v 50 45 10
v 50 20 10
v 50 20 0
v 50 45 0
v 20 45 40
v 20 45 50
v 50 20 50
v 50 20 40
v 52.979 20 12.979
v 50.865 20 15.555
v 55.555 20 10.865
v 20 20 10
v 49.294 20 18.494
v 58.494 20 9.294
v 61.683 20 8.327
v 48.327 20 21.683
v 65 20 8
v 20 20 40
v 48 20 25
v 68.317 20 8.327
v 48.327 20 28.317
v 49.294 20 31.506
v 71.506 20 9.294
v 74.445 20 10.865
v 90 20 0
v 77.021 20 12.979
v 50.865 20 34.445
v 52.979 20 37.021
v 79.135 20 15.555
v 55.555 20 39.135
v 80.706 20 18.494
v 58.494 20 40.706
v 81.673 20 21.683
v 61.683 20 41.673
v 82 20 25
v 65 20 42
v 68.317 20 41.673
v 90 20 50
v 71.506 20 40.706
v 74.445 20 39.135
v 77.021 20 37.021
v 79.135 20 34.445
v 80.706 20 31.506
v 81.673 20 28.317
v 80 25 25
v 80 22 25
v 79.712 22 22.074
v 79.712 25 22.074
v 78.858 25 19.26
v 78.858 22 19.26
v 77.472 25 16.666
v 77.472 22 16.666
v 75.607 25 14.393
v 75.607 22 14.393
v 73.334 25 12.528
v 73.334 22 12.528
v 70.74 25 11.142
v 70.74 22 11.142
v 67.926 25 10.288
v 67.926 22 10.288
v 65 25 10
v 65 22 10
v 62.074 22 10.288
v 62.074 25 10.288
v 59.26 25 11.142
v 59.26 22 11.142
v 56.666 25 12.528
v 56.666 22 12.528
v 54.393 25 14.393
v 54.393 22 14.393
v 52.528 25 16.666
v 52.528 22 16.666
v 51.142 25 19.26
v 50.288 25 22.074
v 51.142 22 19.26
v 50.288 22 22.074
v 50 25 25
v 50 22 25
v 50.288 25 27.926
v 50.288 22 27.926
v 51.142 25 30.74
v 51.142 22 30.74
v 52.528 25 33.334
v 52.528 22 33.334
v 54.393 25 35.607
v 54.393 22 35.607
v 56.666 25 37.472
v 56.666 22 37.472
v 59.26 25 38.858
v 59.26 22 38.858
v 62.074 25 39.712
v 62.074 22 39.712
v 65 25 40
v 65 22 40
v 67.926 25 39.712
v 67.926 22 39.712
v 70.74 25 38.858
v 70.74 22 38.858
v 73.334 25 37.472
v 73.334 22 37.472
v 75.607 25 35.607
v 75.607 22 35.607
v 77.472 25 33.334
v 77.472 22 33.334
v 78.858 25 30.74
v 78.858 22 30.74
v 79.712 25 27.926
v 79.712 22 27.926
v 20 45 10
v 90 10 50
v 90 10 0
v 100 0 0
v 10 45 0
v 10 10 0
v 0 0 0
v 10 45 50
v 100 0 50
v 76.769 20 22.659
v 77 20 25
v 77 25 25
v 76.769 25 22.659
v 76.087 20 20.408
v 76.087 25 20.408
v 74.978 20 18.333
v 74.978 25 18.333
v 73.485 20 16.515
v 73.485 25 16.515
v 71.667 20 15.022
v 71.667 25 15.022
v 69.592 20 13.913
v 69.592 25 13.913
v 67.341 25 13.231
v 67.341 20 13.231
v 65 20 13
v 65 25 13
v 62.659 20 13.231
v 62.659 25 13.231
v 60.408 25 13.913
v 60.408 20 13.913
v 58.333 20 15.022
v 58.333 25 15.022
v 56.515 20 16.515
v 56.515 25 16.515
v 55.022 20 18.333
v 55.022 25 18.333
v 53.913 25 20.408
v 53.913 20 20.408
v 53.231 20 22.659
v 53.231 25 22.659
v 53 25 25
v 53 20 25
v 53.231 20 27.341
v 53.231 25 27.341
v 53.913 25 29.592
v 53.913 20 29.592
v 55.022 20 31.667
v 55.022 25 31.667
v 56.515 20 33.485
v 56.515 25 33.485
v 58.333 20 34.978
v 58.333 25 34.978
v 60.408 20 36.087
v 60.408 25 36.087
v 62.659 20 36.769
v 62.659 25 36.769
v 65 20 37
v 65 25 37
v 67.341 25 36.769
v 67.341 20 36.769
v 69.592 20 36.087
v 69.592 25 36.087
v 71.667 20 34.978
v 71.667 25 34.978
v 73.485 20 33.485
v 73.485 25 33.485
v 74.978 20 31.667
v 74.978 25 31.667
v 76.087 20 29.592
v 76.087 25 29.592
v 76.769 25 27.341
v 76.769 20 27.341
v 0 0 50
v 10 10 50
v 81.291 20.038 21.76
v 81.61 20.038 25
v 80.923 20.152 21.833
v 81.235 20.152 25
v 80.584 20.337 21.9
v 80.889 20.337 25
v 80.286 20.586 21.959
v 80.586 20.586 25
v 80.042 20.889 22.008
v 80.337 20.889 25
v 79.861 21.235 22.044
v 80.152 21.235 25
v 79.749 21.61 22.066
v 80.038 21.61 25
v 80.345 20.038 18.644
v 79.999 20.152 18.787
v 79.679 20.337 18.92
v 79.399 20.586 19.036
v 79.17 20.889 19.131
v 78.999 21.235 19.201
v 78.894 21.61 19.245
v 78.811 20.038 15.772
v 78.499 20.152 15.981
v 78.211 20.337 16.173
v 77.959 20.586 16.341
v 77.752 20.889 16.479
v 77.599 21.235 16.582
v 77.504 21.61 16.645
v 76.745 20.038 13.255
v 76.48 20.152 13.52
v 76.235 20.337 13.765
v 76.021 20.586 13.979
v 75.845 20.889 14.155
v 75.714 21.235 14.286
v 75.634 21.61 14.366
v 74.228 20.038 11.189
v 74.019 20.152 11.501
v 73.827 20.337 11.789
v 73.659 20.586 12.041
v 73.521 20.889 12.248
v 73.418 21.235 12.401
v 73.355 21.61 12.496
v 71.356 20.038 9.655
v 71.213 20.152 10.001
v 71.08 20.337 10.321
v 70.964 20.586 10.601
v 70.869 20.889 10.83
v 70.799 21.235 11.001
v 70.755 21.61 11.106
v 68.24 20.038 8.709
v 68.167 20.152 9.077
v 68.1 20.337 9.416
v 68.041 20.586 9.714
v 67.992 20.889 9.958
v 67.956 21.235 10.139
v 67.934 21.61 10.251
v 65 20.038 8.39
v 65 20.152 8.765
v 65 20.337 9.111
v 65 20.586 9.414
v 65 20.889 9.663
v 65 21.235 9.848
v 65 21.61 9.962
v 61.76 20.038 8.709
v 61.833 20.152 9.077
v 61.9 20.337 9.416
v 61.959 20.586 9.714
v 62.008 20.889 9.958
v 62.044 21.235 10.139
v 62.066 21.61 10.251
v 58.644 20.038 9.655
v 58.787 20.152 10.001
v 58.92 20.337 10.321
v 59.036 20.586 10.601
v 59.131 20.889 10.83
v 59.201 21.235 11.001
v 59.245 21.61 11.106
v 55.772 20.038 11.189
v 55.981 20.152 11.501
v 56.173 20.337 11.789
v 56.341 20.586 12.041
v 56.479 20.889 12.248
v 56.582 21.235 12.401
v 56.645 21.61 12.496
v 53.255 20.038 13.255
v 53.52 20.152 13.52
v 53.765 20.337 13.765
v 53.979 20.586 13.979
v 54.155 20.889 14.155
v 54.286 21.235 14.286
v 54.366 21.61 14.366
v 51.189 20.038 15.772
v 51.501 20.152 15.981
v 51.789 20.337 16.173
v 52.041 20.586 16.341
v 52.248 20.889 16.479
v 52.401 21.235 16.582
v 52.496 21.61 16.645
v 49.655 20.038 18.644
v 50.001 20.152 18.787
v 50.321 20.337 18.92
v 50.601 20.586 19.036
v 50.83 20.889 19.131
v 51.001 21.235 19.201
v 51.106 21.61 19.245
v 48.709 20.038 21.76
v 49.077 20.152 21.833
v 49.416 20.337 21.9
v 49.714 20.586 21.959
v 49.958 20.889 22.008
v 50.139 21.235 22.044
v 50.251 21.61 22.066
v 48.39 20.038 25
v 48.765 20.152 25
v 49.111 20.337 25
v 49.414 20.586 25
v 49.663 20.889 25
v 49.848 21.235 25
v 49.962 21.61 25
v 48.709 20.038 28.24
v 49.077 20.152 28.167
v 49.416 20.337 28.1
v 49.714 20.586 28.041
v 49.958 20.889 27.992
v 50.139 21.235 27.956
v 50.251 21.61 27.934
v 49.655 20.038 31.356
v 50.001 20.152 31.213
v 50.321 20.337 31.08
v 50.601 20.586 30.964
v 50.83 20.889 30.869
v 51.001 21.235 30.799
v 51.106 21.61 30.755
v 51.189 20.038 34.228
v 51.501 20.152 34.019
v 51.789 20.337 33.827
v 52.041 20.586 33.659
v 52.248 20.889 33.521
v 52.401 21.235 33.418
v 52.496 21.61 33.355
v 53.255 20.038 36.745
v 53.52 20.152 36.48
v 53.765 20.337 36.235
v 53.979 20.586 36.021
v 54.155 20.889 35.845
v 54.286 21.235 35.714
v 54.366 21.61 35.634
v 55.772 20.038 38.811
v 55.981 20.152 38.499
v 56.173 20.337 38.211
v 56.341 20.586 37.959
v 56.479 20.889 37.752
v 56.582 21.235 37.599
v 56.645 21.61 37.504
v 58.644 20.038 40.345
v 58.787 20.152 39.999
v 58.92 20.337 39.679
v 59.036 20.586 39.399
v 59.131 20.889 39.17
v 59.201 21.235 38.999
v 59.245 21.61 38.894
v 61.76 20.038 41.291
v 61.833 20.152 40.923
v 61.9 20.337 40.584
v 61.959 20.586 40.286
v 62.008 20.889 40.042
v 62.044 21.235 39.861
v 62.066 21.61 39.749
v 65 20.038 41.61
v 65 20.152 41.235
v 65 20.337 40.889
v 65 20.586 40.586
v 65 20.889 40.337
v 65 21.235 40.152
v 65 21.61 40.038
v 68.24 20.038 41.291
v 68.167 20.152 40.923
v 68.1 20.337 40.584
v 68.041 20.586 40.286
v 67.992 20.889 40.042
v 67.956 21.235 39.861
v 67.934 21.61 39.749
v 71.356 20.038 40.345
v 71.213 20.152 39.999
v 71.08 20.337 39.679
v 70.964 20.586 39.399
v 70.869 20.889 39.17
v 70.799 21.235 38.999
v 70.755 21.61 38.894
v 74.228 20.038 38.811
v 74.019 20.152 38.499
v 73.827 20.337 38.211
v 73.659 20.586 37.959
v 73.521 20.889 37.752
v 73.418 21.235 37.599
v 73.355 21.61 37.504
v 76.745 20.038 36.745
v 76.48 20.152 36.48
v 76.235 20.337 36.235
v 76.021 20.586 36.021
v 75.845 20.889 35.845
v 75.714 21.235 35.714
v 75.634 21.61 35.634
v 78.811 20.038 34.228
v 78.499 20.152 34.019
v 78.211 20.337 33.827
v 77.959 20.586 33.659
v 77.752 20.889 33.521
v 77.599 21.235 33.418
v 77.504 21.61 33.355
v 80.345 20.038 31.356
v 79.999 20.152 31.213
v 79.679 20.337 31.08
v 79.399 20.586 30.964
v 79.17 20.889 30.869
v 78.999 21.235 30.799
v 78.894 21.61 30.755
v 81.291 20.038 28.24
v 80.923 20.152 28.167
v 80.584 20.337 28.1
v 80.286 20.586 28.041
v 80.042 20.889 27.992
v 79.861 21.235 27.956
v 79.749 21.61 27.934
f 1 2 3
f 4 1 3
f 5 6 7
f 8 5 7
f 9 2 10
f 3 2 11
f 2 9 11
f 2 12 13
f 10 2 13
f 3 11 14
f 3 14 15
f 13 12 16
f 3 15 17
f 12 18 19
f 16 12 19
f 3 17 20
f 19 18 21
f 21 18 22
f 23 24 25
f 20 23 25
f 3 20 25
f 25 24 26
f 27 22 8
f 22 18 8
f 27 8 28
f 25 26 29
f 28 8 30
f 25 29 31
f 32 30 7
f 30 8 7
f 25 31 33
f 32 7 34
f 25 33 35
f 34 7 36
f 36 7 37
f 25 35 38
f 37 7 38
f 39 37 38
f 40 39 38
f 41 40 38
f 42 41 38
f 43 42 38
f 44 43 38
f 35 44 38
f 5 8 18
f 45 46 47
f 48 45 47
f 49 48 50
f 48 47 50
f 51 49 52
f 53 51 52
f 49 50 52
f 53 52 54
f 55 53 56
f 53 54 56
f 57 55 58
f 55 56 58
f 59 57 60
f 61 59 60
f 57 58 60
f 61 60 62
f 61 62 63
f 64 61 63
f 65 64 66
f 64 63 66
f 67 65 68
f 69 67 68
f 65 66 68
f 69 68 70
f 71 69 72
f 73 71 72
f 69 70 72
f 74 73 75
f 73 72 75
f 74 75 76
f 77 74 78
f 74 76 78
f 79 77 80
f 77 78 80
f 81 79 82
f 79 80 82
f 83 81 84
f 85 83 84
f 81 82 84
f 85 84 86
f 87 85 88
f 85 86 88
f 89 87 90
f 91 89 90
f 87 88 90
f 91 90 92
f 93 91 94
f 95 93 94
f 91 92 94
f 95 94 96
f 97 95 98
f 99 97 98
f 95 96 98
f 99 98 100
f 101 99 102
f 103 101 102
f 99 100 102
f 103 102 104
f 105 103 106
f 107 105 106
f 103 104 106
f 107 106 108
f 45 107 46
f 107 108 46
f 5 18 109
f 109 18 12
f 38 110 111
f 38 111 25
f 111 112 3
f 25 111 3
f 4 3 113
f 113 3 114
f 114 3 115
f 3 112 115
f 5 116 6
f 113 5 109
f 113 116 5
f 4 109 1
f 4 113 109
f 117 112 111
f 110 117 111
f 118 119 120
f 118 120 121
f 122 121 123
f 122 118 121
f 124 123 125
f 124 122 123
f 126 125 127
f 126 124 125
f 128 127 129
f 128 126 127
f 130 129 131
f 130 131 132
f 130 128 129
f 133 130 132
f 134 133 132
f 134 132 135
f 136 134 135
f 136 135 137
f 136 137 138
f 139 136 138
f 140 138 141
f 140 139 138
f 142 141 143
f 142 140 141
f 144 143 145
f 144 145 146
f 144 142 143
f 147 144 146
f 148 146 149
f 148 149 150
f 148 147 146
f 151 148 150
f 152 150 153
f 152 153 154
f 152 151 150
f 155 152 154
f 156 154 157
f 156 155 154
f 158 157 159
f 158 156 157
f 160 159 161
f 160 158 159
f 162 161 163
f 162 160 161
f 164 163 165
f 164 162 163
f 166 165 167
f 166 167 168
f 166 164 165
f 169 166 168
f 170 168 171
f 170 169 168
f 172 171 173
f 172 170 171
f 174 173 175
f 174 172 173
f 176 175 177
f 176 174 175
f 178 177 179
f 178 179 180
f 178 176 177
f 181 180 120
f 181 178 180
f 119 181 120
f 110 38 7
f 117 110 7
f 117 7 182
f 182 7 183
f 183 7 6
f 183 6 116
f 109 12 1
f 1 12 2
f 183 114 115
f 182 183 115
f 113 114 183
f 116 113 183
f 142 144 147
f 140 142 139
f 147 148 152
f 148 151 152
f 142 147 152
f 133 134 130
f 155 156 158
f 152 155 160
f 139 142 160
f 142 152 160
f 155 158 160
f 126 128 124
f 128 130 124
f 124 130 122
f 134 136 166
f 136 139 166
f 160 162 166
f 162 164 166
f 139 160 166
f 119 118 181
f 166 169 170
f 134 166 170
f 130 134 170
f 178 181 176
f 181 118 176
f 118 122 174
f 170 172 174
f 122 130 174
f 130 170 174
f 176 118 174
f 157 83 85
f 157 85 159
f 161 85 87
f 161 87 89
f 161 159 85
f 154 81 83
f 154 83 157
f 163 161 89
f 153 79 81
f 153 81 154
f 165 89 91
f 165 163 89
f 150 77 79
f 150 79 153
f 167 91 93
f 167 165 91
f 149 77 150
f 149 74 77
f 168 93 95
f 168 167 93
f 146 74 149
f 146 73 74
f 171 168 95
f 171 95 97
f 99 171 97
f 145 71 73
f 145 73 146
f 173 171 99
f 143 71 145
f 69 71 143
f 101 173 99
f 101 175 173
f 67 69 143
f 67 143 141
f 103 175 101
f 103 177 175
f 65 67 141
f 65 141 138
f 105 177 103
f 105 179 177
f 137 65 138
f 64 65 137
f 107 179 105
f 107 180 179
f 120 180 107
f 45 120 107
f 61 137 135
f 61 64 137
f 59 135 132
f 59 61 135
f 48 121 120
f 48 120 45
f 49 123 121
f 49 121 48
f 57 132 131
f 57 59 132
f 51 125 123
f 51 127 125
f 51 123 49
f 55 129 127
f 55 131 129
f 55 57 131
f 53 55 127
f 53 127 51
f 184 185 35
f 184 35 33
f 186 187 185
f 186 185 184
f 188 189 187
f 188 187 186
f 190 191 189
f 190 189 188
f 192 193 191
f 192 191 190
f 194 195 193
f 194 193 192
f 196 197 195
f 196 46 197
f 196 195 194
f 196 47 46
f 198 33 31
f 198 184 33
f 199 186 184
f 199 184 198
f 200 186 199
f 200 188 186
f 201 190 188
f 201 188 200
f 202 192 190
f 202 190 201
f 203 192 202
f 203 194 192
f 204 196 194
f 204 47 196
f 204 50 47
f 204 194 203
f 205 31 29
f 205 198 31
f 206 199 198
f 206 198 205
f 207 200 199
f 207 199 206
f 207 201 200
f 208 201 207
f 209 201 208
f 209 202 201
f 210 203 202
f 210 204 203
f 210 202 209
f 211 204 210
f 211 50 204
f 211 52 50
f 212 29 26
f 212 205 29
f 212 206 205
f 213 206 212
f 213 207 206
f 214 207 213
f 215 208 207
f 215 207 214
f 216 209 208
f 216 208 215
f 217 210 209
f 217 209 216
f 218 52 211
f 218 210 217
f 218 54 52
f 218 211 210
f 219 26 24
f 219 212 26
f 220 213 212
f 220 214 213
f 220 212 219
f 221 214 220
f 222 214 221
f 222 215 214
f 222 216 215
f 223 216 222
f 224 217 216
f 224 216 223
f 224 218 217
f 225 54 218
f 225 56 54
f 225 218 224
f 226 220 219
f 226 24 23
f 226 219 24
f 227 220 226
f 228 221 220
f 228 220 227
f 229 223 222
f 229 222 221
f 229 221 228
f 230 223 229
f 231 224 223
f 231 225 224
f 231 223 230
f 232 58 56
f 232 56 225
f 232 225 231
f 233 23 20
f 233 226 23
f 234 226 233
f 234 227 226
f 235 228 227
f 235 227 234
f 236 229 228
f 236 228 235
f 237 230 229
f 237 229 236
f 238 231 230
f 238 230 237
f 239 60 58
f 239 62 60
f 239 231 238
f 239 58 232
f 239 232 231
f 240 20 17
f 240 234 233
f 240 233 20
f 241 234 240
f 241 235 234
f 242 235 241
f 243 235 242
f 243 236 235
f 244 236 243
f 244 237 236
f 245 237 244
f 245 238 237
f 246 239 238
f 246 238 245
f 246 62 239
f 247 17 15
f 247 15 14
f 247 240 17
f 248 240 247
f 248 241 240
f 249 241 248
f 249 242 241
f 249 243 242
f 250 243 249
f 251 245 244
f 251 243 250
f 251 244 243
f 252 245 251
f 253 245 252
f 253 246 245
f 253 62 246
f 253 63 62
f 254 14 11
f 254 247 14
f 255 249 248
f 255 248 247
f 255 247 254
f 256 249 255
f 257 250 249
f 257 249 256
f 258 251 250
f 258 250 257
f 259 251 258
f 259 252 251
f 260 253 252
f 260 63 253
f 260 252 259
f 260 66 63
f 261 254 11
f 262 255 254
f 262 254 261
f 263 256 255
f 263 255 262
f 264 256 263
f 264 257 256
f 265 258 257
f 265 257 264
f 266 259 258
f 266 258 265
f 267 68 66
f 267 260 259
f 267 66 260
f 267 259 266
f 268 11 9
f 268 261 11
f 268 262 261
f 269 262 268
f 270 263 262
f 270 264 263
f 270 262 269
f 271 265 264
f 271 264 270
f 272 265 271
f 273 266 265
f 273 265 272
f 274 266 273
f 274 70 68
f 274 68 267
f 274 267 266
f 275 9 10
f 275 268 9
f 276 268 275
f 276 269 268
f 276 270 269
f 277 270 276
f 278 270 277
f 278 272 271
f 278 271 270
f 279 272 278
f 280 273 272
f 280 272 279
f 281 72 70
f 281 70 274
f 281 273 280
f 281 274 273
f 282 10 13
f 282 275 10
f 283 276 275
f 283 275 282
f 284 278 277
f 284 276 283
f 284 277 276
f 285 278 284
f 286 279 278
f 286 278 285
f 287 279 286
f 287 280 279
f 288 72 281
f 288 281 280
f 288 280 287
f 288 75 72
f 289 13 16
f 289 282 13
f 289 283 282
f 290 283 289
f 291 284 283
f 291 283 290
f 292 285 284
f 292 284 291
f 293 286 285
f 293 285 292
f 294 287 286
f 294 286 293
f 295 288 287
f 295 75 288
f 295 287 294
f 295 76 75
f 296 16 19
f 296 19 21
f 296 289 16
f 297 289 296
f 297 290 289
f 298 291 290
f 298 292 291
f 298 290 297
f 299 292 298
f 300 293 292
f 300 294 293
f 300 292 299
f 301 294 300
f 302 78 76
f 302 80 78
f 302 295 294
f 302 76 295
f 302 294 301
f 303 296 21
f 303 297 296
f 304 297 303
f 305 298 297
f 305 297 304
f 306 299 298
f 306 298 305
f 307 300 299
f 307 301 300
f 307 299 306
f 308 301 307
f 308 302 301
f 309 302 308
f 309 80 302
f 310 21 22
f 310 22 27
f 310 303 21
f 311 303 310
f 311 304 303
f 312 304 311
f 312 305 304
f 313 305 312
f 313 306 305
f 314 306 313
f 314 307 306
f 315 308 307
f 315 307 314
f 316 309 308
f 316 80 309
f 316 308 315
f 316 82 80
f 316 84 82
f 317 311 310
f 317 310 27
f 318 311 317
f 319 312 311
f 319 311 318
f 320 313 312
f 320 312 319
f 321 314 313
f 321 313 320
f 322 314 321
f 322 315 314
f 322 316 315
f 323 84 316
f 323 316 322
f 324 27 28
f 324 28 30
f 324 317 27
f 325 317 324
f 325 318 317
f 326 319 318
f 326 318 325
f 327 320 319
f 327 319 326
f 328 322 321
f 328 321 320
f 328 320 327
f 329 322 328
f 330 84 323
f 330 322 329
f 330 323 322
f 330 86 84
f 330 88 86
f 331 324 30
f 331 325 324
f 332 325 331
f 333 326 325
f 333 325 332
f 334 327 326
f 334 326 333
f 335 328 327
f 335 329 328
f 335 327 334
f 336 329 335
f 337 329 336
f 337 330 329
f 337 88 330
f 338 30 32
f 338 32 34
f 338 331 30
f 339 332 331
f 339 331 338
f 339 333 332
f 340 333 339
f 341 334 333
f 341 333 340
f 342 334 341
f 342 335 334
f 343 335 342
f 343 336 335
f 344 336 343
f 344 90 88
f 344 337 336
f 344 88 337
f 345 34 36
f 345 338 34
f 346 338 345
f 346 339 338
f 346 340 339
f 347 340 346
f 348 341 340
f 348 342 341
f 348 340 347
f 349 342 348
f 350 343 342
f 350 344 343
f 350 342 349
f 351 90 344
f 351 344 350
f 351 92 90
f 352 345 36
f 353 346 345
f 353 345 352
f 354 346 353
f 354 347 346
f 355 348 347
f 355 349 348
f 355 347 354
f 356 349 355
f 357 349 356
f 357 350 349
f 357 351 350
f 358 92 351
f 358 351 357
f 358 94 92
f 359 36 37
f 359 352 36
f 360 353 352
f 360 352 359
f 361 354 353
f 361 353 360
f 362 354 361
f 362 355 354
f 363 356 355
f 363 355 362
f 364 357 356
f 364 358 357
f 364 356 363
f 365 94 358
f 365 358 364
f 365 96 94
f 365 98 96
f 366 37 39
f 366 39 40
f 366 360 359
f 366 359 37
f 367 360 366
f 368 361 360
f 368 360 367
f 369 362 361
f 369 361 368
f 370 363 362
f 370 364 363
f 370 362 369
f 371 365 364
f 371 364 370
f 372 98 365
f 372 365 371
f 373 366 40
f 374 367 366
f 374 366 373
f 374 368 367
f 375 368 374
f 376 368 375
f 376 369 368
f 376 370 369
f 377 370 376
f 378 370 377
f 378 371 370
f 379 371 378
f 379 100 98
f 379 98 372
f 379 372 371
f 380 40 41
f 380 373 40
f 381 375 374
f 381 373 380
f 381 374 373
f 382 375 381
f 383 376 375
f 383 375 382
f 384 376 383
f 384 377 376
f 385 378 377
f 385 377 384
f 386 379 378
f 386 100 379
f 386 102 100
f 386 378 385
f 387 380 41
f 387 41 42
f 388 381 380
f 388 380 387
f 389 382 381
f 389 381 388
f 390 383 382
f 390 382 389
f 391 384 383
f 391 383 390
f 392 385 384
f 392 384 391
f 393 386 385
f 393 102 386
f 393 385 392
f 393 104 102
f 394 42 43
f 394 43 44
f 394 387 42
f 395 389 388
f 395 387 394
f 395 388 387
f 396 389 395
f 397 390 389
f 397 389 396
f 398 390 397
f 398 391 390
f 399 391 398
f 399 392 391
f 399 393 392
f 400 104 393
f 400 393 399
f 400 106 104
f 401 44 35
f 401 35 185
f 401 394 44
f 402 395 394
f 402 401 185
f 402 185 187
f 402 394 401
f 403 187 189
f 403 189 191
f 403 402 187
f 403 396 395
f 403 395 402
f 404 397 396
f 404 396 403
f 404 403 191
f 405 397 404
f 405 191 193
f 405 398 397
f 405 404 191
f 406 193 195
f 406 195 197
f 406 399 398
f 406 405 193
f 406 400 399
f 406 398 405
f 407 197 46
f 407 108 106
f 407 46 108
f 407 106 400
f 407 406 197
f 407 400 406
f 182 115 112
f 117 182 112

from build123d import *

# Parameters (mm, degrees)
BOSS_EXTRU_3_DEPTH = 50
ESQUISSE3_W        = 80
ESQUISSE3_H        = 10
BOSS_EXTRU_4_DEPTH = 50
ESQUISSE4_R        = 15
ESQUISSE4_R_2      = 12
BOSS_EXTRU_5_DEPTH = 5
CONG_1_R           = 2
BOSS_EXTRU_6_DEPTH = 25
BOSS_EXTRU_7_DEPTH = 10


with BuildPart() as part:
    # Esquisse2 → Boss.-Extru.3 (new body)
    with BuildSketch(Plane.XY):
        Polygon((0, 0), (100, 0), (90, 10), (10, 10), align=None)
    extrude(amount=BOSS_EXTRU_3_DEPTH)

    # Esquisse3 → Boss.-Extru.4 (add)
    with BuildSketch(Plane.XY.offset(50)):
        with Locations((50, 15)):
            Rectangle(ESQUISSE3_W, ESQUISSE3_H)
    extrude(amount=-BOSS_EXTRU_4_DEPTH)

    # Esquisse4 → Boss.-Extru.5 (add)
    with BuildSketch(Plane(origin=(0, 20, 0), x_dir=(1, 0, 0), z_dir=(0, 1, 0))):
        with Locations((65, -25)):
            Circle(ESQUISSE4_R)
        with Locations((65, -25)):
            Circle(ESQUISSE4_R_2, mode=Mode.SUBTRACT)
    extrude(amount=BOSS_EXTRU_5_DEPTH)

    # Congé1
    cong_1_edges = [part.edges().sort_by_distance(p)[0] for p in [
        (50, 20, 25),
    ]]
    fillet(cong_1_edges, radius=CONG_1_R)

    # Esquisse5 → Boss.-Extru.6 (add)
    with BuildSketch(Plane(origin=(0, 20, 0), x_dir=(1, 0, 0), z_dir=(0, 1, 0))):
        Polygon((20, 0), (10, 0), (10, -50), (20, -50), (20, -10), (50, -10), (50, 0), align=None)
    extrude(amount=BOSS_EXTRU_6_DEPTH)

    # Esquisse6 → Boss.-Extru.7 (add)
    with BuildSketch(Plane.XY.offset(50)):
        Polygon((20, 45), (50, 20), (20, 20), align=None)
    extrude(amount=-BOSS_EXTRU_7_DEPTH)


solid = part.part
